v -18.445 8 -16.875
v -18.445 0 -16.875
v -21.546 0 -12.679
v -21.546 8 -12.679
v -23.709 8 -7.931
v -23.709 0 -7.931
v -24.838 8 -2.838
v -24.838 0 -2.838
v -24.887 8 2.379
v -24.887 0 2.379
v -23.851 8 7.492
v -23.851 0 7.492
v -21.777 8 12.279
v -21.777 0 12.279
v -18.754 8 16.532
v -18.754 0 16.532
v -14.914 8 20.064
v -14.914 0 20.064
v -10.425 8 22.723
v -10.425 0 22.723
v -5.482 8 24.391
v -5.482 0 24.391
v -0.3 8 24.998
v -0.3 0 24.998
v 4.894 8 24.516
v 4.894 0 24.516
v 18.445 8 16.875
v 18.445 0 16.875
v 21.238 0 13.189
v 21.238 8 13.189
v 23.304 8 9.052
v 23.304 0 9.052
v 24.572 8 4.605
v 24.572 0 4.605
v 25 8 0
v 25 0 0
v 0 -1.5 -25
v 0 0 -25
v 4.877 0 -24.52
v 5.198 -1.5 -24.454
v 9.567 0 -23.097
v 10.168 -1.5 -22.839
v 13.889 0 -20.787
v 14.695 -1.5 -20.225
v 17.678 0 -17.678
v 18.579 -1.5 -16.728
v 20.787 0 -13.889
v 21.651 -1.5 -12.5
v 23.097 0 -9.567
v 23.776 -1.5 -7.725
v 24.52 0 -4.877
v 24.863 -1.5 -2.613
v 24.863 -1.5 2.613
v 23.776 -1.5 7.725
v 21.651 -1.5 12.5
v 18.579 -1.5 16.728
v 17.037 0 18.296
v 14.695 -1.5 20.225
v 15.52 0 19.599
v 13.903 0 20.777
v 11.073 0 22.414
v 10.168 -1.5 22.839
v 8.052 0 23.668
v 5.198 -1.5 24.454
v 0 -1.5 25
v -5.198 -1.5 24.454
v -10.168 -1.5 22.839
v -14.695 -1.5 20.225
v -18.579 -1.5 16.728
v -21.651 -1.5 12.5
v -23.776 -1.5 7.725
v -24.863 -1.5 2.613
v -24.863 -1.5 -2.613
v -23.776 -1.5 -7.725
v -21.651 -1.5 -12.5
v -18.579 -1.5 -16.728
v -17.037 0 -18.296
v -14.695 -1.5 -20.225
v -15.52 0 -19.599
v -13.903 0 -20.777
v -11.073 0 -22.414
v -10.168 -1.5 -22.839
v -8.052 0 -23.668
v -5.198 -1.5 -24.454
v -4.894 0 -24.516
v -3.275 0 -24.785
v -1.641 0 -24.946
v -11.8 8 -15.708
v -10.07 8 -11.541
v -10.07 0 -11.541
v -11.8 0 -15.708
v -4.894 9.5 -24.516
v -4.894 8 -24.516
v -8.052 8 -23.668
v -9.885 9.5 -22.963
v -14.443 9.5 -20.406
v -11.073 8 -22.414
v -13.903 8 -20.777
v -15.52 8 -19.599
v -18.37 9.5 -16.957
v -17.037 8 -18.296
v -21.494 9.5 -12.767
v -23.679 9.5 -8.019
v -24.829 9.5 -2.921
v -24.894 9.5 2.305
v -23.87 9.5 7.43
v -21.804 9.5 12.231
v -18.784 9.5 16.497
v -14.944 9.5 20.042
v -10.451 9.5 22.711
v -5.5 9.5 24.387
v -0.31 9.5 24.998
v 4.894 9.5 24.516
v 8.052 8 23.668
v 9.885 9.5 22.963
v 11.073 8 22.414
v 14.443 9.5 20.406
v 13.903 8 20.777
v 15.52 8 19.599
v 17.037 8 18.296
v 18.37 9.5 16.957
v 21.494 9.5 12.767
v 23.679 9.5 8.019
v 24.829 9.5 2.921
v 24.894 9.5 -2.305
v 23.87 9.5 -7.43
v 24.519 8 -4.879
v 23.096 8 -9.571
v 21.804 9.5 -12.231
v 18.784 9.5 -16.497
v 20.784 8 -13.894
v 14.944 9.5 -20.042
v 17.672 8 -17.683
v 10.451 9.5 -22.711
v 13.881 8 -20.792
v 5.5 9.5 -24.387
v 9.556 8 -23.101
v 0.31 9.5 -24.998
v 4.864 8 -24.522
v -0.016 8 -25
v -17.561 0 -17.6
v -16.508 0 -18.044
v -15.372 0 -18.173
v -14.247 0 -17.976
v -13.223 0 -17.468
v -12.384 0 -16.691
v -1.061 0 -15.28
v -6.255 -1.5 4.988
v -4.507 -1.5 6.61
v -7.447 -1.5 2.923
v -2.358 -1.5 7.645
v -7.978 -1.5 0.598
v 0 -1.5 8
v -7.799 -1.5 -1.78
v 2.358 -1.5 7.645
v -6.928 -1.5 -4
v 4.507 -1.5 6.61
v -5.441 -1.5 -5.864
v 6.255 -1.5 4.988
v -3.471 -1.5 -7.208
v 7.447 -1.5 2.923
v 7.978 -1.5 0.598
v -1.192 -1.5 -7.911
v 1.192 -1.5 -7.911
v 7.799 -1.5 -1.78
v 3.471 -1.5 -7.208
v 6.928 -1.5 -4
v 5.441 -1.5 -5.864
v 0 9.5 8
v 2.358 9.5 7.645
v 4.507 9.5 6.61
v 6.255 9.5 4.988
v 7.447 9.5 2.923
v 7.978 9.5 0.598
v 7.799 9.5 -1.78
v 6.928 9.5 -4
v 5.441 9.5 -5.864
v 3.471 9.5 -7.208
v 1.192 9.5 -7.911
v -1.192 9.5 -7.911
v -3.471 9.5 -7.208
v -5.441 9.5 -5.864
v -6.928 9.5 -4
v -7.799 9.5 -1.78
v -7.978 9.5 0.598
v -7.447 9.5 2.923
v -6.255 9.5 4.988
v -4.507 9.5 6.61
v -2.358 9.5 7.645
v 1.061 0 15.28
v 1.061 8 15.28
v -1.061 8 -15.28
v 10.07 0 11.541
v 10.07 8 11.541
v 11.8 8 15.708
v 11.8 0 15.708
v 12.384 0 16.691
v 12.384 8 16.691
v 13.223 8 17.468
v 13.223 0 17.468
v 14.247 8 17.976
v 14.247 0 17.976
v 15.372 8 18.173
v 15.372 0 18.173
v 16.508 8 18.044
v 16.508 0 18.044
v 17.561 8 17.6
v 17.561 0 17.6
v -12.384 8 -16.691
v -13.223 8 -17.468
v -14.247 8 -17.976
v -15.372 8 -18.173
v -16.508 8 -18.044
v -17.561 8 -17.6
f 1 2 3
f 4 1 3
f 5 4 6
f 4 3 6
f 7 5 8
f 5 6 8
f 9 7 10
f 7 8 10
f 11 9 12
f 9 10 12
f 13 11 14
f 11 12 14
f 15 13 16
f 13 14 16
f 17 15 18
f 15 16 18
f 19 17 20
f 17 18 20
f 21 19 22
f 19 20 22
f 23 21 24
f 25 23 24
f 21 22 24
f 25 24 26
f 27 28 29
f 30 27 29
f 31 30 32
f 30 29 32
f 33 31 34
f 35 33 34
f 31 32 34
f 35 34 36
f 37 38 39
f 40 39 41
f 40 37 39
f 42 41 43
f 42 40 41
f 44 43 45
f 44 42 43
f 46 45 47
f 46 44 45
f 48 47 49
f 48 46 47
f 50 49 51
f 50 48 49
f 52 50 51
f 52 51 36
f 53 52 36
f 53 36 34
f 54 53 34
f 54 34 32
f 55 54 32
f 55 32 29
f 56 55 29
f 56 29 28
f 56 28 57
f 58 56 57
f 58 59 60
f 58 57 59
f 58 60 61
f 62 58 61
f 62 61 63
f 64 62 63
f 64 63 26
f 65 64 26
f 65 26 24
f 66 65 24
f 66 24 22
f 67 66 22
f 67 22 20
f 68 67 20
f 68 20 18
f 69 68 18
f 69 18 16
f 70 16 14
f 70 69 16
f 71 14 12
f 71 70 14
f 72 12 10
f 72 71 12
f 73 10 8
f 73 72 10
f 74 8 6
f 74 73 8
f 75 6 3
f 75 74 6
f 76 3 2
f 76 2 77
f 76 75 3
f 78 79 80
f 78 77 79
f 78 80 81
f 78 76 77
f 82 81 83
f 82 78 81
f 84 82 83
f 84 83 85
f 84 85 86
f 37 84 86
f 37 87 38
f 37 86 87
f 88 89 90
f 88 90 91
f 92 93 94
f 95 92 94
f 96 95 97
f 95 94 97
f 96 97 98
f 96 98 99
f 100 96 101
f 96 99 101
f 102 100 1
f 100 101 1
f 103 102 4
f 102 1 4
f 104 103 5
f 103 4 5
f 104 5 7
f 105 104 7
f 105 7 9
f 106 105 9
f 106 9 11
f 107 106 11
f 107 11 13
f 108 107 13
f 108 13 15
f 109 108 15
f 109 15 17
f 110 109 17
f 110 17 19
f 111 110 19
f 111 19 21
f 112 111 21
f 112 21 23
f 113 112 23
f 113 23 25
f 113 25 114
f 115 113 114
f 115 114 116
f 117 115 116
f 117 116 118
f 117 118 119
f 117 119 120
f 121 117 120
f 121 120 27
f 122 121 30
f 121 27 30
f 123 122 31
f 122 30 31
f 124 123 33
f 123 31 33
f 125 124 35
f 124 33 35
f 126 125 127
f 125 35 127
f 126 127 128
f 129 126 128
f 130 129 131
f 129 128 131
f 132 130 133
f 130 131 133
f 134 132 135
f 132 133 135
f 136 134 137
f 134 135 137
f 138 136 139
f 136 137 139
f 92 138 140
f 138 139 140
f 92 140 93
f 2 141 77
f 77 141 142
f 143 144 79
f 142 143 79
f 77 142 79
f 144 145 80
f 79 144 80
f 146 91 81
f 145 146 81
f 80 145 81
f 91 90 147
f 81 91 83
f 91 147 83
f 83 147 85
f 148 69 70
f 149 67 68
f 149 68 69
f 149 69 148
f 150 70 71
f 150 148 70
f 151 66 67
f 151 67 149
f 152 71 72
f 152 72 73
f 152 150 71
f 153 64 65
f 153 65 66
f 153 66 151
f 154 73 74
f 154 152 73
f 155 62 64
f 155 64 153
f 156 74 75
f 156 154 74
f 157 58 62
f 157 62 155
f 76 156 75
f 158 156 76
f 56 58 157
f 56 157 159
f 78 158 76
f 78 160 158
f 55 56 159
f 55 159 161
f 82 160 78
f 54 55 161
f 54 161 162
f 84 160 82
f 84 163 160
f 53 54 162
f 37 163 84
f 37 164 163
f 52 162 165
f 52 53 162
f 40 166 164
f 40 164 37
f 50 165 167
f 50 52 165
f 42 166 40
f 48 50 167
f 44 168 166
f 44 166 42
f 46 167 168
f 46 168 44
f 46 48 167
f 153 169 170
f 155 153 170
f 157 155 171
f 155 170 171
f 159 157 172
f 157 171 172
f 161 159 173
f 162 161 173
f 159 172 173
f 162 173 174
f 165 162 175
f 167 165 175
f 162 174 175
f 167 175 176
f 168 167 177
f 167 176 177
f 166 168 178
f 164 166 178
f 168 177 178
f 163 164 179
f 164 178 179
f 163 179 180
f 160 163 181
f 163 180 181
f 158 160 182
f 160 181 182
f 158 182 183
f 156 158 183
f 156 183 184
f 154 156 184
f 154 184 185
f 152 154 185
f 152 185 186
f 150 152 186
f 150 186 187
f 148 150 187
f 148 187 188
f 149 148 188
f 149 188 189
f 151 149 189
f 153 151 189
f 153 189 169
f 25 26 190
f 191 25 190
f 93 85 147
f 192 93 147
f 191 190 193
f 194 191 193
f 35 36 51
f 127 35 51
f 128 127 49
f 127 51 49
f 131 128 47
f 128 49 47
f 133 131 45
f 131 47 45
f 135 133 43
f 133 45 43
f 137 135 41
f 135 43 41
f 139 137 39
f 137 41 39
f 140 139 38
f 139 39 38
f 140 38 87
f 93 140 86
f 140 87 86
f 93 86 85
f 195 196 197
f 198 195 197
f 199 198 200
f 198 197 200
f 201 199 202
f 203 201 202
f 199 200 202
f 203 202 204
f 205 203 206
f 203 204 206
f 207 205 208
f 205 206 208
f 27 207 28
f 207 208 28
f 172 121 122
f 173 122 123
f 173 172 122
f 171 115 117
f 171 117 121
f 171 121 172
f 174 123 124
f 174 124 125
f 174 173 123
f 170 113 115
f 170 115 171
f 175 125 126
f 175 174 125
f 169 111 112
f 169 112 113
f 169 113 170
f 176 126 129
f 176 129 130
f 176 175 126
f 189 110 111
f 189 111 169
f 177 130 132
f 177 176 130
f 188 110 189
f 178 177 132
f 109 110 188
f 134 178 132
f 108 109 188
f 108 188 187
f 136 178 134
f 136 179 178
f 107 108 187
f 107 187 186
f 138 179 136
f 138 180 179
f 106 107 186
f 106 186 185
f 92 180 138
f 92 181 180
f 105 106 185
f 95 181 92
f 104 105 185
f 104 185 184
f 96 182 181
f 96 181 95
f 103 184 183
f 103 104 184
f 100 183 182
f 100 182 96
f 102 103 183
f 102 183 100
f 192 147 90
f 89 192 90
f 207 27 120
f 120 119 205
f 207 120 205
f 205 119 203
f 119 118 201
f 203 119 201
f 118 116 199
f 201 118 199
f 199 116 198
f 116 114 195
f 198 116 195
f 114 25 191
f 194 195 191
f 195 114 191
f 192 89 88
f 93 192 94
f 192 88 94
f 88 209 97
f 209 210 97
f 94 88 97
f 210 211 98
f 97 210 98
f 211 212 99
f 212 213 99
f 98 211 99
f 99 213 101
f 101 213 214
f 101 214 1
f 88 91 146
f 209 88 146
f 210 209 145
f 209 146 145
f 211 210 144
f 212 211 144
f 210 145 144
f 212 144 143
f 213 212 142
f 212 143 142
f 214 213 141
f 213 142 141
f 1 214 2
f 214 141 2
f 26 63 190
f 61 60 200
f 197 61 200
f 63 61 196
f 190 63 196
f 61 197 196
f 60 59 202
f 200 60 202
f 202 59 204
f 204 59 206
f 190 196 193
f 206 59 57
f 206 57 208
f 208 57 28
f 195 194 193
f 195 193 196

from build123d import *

# Parameters (mm, degrees)
BOSS_EXTRUDE1_DEPTH = 8
SKETCH2_R           = 25
BOSS_EXTRUDE2_DEPTH = 1.5
BOSS_EXTRUDE3_START = 1.5
SKETCH3_R           = 25
BOSS_EXTRUDE3_DEPTH = 1.5
SKETCH4_R           = 8
CUT_EXTRUDE1_DEPTH  = 38.027017163
FILLET1_R           = 4


with BuildPart() as part:
    # Sketch1 → Boss-Extrude1 (new body)
    with BuildSketch(Plane(origin=(0, 0, 0), x_dir=(1, 0, 0), z_dir=(0, 1, 0))):
        with BuildLine():
            ThreePointArc((-13.903357517, 20.777310936), (-23.090394822, -9.582988415), (4.894388058, -24.516218418))
            Line((4.894388058, -24.516218418), (1.061192692, -15.28006049))
            Line((1.061192692, -15.28006049), (10.070162151, -11.541153008))
            Line((10.070162151, -11.541153008), (13.903357517, -20.777310936))
            ThreePointArc((13.903357517, -20.777310936), (22.052028681, -11.777437371), (25, 0))
            ThreePointArc((25, 0), (15.85308012, 19.330800571), (-4.894388058, 24.516218418))
            Line((-4.894388058, 24.516218418), (-1.061192692, 15.28006049))
            Line((-1.061192692, 15.28006049), (-10.070162151, 11.541153008))
            Line((-10.070162151, 11.541153008), (-13.903357517, 20.777310936))
        make_face()
    extrude(amount=BOSS_EXTRUDE1_DEPTH)

    # Sketch2 → Boss-Extrude2 (add)
    with BuildSketch(Plane(origin=(0, 8, 0), x_dir=(1, 0, 0), z_dir=(0, 1, 0))):
        with Locations(Location((0, 0, 0), (0, 0, 101.290031001))):
            Circle(SKETCH2_R)
    extrude(amount=BOSS_EXTRUDE2_DEPTH)

    # Sketch3 → Boss-Extrude3 (add)
    with BuildSketch(Plane(origin=(0, 0, 0), x_dir=(-1, 0, 0), z_dir=(0, -1, 0)).offset(BOSS_EXTRUDE3_START)):
        with Locations(Location((0, 0, 0), (0, 0, 90))):
            Circle(SKETCH3_R)
    extrude(amount=-BOSS_EXTRUDE3_DEPTH)

    # Sketch4 → Cut-Extrude1 (cut, through all)
    with BuildSketch(Plane(origin=(0, 9.5, 0), x_dir=(1, 0, 0), z_dir=(0, 1, 0))):
        with Locations(Location((0, 0, 0), (0, 0, 270))):
            Circle(SKETCH4_R)
    extrude(amount=-CUT_EXTRUDE1_DEPTH, mode=Mode.SUBTRACT)

    # Fillet1
    # the kernel refuses this fillet: 4 mm, written as the material it takes off along each edge
    with BuildSketch(Plane(origin=(-13.903357517, 0, -20.777310936), x_dir=(-0.7585073029856567, 0, 0.6516645389442524), z_dir=(0, 1, 0)), Plane(origin=(13.903357517, 0, 20.777310936), x_dir=(0.7585073029856618, 0, -0.6516645389442466), z_dir=(0, 1, 0))) as fillet1_piece_1:
        with BuildLine():
            CenterArc((5.509030911, 3.971210744), FILLET1_R, 161.872235739, 115.006104931)
            Line((1.707570619, 5.215758711), (0, 0))
            ThreePointArc((0, 0), (2.994038539, -0.179932852), (5.988077078, 0))
        make_face()
    extrude(amount=8, mode=Mode.SUBTRACT)


solid = part.part
